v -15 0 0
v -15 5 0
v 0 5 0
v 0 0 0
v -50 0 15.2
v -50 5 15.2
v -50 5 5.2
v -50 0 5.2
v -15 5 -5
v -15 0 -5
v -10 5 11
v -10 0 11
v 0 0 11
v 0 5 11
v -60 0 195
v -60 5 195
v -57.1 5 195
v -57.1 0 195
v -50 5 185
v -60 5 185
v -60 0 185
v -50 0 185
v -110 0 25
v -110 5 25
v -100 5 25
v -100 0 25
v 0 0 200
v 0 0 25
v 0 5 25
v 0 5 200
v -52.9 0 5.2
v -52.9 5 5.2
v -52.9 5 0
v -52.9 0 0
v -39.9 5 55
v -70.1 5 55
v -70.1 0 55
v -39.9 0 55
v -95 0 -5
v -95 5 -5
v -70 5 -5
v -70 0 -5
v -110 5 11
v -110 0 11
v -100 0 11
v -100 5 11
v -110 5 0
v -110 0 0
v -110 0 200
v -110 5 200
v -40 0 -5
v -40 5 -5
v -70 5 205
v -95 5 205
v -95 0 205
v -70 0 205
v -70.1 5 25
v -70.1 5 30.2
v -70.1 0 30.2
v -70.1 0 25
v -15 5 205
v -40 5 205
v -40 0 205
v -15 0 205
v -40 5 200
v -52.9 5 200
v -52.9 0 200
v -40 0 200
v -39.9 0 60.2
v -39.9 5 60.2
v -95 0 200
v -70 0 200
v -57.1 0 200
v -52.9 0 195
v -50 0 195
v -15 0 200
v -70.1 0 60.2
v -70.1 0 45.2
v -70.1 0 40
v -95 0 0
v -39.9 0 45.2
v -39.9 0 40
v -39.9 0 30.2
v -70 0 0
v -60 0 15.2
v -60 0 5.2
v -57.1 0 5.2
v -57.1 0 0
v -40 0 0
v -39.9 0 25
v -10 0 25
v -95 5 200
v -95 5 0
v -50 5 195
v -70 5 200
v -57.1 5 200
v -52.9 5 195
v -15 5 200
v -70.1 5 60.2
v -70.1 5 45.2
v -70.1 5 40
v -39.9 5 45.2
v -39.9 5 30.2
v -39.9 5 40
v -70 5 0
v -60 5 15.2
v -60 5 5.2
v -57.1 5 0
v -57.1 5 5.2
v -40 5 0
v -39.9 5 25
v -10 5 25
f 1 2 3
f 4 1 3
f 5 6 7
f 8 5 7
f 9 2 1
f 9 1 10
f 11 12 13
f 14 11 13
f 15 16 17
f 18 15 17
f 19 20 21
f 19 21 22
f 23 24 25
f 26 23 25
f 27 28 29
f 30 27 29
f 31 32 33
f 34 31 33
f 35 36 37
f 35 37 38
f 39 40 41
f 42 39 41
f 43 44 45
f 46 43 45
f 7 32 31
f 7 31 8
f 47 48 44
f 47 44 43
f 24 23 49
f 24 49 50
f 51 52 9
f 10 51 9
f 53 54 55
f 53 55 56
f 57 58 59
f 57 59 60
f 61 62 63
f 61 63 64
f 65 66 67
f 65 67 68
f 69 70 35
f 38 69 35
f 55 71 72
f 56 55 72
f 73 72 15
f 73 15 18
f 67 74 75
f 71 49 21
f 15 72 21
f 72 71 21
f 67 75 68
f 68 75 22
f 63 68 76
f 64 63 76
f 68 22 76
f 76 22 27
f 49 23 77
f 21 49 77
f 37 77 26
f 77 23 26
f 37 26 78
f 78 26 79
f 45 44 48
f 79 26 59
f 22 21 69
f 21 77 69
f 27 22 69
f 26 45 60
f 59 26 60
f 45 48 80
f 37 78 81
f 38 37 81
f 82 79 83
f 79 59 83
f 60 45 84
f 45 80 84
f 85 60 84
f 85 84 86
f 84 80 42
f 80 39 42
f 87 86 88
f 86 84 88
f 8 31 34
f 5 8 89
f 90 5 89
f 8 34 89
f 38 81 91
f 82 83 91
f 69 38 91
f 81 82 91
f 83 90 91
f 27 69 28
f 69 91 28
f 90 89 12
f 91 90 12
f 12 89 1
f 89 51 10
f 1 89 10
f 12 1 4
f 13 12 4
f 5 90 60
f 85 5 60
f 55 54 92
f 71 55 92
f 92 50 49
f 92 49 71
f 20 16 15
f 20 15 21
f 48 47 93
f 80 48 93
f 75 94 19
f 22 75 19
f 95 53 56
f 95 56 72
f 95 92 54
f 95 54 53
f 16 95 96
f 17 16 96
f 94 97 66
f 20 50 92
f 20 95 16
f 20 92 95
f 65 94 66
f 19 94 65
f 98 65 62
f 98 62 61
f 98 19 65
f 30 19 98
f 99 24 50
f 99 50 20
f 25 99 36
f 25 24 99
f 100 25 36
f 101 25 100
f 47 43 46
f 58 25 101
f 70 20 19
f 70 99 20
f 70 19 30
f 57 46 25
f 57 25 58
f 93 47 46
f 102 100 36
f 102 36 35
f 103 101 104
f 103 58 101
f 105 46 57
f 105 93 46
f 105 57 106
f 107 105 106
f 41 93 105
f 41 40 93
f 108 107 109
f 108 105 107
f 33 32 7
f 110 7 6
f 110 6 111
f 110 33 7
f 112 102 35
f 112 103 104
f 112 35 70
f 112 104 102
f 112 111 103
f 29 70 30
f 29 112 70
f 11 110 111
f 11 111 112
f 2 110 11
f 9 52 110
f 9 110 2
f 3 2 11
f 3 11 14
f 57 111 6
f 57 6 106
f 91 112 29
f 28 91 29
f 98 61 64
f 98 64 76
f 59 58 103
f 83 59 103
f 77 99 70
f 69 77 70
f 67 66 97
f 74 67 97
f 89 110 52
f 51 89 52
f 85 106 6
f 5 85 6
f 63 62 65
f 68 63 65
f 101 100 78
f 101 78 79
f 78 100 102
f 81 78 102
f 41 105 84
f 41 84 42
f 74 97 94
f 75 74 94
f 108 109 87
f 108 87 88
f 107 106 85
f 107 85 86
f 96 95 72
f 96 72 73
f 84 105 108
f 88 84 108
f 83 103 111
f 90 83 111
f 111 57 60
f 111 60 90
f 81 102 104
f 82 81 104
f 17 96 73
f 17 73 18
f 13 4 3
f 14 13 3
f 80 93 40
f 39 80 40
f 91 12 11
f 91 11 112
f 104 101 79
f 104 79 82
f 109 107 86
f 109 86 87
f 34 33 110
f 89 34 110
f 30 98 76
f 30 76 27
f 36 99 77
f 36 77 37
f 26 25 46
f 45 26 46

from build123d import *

# Parameters (mm, degrees)
SKETCH1_W           = 110
SKETCH1_H           = 5
BOSS_EXTRUDE1_DEPTH = 200
SKETCH2_W           = 25
SKETCH2_H           = 5
BOSS_EXTRUDE2_DEPTH = 5
SKETCH4_W           = 30.2
SKETCH4_H           = 5.2
CUT_EXTRUDE1_DEPTH  = 5
SKETCH5_W           = 4.2
SKETCH5_H           = 5.2
SKETCH5_W_2         = 10
SKETCH5_H_2         = 10
SKETCH5_H_3         = 5
CUT_EXTRUDE2_DEPTH  = 10
SKETCH6_W           = 10
SKETCH6_H           = 5
CUT_EXTRUDE3_DEPTH  = 5
SKETCH7_W           = 10
SKETCH7_H           = 9
CUT_EXTRUDE4_DEPTH  = 10


with BuildPart() as part:
    # Sketch1 → Boss-Extrude1 (new body)
    with BuildSketch(Plane.XY):
        with Locations((-55, 2.5)):
            Rectangle(SKETCH1_W, SKETCH1_H)
    extrude(amount=BOSS_EXTRUDE1_DEPTH)

    # Sketch2 → Boss-Extrude2 (add)
    with BuildSketch(Plane(origin=(0, 5, 0), x_dir=(1, 0, 0), z_dir=(0, 1, 0))):
        with Locations((-82.5, 2.5)):
            Rectangle(SKETCH2_W, SKETCH2_H)
        with Locations((-27.5, 2.5)):
            Rectangle(SKETCH2_W, SKETCH2_H)
        with Locations((-27.5, -202.5)):
            Rectangle(SKETCH2_W, SKETCH2_H)
        with Locations((-82.5, -202.5)):
            Rectangle(SKETCH2_W, SKETCH2_H)
    extrude(amount=-BOSS_EXTRUDE2_DEPTH)

    # Sketch4 → Cut-Extrude1 (cut)
    with BuildSketch(Plane(origin=(0, 5, 0), x_dir=(1, 0, 0), z_dir=(0, 1, 0))):
        with Locations((-55, -27.6)):
            Rectangle(SKETCH4_W, SKETCH4_H)
        with Locations((-55, -42.6)):
            Rectangle(SKETCH4_W, SKETCH4_H)
        with Locations((-55, -57.6)):
            Rectangle(SKETCH4_W, SKETCH4_H)
    extrude(amount=-CUT_EXTRUDE1_DEPTH, mode=Mode.SUBTRACT)

    # Sketch5 → Cut-Extrude2 (cut)
    with BuildSketch(Plane(origin=(0, 5, 0), x_dir=(1, 0, 0), z_dir=(0, 1, 0))):
        with Locations((-55, -2.6)):
            Rectangle(SKETCH5_W, SKETCH5_H)
        with Locations((-55, -10.2)):
            Rectangle(SKETCH5_W_2, SKETCH5_H_2)
        with Locations((-55, -197.5)):
            Rectangle(SKETCH5_W, SKETCH5_H_3)
        with Locations((-55, -190)):
            Rectangle(SKETCH5_W_2, SKETCH5_H_2)
    extrude(amount=-CUT_EXTRUDE2_DEPTH, mode=Mode.SUBTRACT)

    # Sketch6 → Cut-Extrude3 (cut)
    with BuildSketch(Plane(origin=(0, 5, 0), x_dir=(1, 0, 0), z_dir=(0, 1, 0))):
        with Locations((-105, -22.5)):
            Rectangle(SKETCH6_W, SKETCH6_H)
        with Locations((-5, -22.5)):
            Rectangle(SKETCH6_W, SKETCH6_H)
    extrude(amount=-CUT_EXTRUDE3_DEPTH, mode=Mode.SUBTRACT)

    # Sketch7 → Cut-Extrude4 (cut)
    with BuildSketch(Plane.XZ):
        with Locations((-5, 15.5)):
            Rectangle(SKETCH7_W, SKETCH7_H)
        with Locations((-105, 15.5)):
            Rectangle(SKETCH7_W, SKETCH7_H)
    extrude(amount=-CUT_EXTRUDE4_DEPTH, mode=Mode.SUBTRACT)


solid = part.part
